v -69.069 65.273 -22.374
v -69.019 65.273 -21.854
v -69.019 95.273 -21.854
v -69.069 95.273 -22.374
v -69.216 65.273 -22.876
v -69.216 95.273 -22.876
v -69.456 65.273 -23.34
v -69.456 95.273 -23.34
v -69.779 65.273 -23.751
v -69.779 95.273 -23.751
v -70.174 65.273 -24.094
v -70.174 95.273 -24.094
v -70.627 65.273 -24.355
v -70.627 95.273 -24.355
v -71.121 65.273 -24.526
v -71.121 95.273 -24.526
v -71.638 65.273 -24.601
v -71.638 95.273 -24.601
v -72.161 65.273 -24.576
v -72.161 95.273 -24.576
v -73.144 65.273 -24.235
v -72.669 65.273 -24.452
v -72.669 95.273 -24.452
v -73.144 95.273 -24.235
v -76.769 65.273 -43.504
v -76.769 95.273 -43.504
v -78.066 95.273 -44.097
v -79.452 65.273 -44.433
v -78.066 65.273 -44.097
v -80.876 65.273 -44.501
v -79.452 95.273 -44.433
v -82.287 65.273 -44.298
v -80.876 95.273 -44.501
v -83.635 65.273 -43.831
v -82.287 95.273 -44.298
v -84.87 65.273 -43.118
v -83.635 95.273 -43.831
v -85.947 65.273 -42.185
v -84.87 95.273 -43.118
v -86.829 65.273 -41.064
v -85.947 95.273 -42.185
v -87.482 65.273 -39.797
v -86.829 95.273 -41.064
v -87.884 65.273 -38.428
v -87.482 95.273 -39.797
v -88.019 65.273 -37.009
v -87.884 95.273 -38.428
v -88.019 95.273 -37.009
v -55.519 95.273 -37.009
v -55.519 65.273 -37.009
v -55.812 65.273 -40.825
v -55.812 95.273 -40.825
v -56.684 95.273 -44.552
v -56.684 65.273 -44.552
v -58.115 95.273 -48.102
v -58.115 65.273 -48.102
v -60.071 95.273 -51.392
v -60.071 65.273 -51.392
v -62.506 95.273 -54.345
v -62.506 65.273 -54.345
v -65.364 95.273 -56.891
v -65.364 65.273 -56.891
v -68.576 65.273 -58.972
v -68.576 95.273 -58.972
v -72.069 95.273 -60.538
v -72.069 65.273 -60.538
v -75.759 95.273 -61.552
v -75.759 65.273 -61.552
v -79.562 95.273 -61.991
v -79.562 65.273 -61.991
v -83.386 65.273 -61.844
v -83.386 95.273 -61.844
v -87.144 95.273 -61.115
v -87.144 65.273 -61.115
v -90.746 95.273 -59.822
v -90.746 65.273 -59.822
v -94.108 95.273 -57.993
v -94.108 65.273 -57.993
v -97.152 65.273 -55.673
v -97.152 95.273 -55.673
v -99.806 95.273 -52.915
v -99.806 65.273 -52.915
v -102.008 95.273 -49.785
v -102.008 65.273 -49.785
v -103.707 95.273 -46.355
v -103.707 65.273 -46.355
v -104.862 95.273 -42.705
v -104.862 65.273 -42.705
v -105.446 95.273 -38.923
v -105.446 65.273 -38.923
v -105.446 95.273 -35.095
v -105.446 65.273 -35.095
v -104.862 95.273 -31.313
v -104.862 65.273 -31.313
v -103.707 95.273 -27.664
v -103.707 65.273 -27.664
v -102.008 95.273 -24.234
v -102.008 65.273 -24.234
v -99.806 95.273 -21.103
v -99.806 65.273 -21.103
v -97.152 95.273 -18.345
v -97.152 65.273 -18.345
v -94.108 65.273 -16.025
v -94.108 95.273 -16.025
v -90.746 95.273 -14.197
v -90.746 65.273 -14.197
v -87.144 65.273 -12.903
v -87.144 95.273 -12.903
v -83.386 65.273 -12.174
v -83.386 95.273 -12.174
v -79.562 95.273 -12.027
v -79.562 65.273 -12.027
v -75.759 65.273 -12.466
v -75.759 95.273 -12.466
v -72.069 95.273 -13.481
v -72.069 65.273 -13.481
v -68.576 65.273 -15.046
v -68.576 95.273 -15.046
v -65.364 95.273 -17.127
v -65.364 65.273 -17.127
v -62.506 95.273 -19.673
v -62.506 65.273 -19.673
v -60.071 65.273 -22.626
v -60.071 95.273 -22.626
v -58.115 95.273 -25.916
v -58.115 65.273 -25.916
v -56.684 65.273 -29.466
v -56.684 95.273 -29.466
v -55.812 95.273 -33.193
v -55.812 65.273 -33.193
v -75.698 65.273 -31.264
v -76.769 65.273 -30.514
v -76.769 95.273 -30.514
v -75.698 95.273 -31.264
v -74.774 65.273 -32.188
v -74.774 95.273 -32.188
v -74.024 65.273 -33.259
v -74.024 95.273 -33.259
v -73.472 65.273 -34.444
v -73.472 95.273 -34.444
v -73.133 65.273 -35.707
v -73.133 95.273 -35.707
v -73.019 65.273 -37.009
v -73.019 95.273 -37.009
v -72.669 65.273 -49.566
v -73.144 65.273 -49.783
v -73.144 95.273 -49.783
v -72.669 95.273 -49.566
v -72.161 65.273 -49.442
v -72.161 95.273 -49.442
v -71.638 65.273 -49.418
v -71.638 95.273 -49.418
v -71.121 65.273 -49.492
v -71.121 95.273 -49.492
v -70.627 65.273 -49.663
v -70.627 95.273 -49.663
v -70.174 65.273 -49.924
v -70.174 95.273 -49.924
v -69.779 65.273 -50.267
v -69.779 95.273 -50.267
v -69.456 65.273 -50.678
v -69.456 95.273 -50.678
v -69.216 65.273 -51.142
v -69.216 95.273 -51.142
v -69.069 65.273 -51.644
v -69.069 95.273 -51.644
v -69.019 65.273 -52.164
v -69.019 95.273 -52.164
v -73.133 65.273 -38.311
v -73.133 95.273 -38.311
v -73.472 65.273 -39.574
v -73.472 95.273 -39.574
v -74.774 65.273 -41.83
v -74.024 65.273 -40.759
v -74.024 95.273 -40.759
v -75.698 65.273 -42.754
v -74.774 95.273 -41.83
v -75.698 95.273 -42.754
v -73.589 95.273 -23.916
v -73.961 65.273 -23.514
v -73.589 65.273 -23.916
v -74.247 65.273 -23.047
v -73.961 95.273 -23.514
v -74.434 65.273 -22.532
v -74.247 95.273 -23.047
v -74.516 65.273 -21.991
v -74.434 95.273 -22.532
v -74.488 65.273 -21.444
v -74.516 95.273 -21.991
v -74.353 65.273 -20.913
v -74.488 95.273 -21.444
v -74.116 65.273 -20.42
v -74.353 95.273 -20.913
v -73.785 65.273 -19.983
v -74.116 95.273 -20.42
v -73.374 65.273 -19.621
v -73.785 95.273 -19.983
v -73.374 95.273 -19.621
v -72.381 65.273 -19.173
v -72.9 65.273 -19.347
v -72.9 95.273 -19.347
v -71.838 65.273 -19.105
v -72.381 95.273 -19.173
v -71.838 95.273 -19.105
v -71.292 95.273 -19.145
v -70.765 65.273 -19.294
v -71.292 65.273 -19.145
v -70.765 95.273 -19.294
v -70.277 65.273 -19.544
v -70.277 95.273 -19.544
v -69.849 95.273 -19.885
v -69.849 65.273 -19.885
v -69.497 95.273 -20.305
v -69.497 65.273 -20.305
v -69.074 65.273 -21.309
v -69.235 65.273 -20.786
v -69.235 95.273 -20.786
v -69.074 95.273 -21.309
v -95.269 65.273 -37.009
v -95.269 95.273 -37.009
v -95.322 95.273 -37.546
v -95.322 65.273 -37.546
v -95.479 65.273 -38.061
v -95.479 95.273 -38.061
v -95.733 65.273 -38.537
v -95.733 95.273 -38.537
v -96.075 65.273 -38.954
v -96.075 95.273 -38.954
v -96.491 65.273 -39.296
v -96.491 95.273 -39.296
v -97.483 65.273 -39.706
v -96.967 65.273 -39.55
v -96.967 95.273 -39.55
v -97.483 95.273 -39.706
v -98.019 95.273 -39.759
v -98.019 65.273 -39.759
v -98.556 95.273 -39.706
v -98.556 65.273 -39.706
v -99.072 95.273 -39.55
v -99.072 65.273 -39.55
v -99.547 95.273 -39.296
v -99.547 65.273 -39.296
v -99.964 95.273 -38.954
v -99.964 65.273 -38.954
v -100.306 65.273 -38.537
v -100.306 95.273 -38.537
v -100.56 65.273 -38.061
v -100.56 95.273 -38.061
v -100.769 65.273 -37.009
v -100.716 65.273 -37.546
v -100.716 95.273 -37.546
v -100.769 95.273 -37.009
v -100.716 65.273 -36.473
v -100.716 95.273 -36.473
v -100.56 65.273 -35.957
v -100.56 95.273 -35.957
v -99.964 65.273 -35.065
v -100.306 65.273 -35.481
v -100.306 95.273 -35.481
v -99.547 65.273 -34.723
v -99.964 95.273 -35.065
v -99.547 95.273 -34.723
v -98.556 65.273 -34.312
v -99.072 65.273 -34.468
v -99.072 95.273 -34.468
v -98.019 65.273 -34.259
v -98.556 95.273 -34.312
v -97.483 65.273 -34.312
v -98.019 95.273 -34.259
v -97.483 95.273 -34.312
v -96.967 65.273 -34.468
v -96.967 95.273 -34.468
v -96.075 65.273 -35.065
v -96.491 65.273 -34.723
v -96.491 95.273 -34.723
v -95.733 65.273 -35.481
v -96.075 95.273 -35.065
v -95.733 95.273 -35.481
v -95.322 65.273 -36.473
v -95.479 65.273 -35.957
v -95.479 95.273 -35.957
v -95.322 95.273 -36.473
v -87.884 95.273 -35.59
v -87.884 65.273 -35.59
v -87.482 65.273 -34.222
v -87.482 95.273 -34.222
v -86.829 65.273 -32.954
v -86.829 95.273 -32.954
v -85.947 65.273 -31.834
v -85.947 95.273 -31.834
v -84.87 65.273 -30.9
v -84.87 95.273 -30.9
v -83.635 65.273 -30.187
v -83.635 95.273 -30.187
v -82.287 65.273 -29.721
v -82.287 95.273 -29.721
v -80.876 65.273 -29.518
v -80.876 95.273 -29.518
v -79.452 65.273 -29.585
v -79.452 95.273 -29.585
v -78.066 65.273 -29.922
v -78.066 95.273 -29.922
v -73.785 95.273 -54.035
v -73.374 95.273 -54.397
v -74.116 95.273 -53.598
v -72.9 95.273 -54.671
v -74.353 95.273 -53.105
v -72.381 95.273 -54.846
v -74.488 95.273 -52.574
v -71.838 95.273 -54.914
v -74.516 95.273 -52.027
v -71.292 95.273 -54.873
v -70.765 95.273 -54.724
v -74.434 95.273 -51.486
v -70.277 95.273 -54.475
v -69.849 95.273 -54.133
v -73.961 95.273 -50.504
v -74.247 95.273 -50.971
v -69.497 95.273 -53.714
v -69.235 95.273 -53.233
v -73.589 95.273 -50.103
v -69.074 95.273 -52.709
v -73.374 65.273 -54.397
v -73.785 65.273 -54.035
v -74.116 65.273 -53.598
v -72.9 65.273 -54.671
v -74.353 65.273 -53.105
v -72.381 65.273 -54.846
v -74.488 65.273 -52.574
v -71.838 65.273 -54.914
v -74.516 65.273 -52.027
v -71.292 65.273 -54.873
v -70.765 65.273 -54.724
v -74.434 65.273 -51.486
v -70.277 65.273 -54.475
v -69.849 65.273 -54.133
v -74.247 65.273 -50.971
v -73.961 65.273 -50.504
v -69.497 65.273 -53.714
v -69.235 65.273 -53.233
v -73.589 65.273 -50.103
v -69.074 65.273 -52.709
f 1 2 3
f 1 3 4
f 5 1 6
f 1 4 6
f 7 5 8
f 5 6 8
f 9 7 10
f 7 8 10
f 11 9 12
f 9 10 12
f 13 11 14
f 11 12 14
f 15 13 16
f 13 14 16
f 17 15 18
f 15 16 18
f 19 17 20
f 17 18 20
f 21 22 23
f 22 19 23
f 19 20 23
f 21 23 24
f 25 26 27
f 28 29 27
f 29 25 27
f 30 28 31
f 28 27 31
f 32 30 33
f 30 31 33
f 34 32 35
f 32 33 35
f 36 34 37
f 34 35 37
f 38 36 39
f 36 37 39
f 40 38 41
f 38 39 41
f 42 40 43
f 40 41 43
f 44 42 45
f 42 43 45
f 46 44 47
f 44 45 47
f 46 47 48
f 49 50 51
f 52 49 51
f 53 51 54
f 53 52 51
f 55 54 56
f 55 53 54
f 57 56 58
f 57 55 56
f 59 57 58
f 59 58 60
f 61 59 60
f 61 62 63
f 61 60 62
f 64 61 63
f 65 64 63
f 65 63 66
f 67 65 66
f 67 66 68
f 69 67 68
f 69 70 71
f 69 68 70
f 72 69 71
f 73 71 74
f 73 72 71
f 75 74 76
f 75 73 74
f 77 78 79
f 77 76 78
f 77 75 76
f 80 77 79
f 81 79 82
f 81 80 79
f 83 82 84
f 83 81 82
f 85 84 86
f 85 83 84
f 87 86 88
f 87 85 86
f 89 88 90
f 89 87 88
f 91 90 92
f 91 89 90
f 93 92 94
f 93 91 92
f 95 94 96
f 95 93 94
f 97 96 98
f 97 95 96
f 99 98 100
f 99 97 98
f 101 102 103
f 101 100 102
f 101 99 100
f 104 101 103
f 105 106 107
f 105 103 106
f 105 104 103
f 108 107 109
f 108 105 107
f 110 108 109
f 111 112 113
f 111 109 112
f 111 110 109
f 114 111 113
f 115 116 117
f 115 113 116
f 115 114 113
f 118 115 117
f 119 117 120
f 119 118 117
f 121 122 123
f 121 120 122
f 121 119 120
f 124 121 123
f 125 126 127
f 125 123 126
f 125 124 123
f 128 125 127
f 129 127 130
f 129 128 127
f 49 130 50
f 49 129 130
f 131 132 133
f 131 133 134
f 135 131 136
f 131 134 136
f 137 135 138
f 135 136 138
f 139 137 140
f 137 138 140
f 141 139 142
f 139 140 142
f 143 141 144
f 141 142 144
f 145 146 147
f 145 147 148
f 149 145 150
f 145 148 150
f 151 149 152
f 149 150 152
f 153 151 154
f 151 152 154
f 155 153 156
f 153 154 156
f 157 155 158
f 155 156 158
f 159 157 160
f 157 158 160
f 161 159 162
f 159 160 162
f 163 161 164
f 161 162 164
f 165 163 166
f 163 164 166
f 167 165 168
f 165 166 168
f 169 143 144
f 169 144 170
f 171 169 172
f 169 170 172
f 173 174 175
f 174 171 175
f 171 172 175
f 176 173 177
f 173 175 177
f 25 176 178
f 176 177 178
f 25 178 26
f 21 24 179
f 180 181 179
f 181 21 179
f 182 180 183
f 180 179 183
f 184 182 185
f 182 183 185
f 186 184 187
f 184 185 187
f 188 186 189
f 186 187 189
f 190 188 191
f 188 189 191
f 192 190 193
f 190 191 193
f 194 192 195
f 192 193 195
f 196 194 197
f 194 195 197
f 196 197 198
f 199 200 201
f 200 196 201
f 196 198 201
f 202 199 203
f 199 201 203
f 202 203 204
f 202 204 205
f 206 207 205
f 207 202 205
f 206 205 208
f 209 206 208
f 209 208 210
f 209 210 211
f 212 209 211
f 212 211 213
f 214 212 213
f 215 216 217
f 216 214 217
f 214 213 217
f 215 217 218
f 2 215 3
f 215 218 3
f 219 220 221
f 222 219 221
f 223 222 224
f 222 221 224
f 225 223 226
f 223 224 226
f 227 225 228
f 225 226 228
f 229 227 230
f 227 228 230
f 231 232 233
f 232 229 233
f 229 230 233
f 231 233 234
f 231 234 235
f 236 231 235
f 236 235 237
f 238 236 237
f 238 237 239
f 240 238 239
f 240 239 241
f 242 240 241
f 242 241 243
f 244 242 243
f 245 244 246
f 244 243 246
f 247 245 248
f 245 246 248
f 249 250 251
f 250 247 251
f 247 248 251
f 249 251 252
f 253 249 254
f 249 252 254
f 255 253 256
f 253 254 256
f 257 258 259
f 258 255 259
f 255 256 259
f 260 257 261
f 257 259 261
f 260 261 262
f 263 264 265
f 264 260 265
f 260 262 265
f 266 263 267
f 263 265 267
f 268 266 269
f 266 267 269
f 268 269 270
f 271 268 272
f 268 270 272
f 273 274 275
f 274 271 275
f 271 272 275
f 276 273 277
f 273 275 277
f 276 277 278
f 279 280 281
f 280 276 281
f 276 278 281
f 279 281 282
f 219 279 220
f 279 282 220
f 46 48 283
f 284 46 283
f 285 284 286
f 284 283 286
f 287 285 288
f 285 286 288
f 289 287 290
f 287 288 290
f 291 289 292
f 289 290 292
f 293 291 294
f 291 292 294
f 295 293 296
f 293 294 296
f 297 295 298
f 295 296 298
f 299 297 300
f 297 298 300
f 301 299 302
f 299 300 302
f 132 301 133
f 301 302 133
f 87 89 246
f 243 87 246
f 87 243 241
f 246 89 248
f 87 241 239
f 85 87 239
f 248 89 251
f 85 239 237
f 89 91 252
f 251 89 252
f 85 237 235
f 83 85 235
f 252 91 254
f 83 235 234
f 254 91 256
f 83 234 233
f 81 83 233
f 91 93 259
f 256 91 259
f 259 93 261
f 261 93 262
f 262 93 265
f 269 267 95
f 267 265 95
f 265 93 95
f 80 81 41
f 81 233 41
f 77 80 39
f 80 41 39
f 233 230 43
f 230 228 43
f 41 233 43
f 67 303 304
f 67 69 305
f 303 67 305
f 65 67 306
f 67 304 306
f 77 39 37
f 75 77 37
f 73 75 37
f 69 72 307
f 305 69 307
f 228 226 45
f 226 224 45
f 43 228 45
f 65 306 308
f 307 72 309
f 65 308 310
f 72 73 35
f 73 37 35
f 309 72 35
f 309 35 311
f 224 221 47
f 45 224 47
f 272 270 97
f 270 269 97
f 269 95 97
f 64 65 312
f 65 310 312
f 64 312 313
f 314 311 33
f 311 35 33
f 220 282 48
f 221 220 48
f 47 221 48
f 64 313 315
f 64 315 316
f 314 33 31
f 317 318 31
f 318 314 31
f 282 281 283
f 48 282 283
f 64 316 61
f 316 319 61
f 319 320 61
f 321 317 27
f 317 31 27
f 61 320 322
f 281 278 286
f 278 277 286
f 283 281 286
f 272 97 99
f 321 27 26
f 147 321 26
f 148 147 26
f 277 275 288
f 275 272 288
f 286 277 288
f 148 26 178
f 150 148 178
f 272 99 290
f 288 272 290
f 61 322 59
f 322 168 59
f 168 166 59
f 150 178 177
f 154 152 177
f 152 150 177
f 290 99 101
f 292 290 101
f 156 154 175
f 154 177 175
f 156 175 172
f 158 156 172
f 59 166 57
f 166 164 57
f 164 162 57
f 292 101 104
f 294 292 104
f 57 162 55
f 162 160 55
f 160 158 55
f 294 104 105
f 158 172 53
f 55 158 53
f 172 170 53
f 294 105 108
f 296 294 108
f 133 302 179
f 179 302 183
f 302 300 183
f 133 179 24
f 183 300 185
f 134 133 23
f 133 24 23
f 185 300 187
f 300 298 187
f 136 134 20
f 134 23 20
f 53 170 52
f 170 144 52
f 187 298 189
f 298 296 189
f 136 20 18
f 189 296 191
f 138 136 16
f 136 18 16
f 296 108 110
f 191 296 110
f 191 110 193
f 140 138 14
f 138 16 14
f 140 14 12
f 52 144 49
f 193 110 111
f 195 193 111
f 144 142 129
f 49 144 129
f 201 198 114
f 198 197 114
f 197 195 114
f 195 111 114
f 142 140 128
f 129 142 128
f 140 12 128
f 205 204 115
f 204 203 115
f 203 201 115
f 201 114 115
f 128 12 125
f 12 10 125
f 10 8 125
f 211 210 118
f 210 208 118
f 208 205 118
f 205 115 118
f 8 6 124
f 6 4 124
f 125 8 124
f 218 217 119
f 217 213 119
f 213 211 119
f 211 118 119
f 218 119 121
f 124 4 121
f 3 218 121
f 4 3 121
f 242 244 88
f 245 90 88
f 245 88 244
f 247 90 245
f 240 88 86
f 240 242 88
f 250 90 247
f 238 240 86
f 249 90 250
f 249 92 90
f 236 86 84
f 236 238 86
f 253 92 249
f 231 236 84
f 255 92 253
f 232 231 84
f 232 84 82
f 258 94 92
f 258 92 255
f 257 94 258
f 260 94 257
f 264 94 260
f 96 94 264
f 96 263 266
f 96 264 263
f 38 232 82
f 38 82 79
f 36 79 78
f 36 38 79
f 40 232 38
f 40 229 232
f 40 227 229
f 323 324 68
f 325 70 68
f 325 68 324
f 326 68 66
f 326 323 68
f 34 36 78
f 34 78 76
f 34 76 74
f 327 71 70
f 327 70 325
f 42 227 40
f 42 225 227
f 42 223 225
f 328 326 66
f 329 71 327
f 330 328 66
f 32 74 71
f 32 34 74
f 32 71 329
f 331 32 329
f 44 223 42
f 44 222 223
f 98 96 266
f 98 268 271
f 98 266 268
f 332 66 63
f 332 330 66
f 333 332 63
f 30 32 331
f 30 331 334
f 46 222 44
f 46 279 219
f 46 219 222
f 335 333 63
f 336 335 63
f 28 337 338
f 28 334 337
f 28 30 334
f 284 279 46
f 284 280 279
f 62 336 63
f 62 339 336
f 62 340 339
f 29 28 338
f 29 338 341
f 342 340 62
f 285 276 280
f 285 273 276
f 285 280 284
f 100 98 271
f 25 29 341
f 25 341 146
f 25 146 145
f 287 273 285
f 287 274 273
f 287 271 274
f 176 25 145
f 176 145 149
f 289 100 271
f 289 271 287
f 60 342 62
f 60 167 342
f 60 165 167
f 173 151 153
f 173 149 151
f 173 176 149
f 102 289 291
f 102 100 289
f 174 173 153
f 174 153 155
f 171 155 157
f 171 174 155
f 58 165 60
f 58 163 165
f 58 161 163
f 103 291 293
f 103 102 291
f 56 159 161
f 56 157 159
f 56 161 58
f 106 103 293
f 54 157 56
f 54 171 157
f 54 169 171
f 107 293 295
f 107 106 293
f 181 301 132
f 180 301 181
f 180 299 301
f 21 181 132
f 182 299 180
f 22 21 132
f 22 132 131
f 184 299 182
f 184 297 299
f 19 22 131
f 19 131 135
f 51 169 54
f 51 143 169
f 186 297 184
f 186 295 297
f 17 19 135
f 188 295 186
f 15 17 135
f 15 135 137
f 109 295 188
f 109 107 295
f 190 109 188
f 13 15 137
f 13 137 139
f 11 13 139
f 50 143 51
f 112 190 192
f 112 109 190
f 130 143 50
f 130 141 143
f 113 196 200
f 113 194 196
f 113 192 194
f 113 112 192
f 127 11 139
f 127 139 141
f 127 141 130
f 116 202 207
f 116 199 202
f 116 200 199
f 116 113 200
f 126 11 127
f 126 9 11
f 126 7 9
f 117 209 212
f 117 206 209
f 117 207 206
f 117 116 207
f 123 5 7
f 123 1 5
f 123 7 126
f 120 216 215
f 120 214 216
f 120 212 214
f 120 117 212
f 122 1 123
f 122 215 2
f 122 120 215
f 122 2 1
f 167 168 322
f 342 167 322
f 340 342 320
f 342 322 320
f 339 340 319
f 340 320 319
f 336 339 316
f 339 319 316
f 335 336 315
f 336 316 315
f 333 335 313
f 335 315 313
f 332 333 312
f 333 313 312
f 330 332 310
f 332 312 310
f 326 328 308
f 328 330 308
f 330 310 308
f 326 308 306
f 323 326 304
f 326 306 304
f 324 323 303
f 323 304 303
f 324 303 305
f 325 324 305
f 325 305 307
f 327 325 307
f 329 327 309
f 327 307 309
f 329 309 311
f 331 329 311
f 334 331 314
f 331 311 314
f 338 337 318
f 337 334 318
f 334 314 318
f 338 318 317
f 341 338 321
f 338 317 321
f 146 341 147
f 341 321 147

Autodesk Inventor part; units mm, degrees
ref_plane "YZ Plane" through (0, 0, 0) normal (1, 0, 0) x (0, 1, 0)
ref_plane "XZ Plane" through (0, 0, 0) normal (0, 1, 0) x (-1, 0, 0)
ref_plane "XY Plane" through (0, 0, 0) normal (0, 0, 1) x (1, 0, 0)
ref_plane "Work Plane1" through (-80.5192, 95.2728, -37.0091) normal (-0.0000001, -1, 0.0000001) x (1, -0.0000001, 0)
sketch "Sketch1" plane through (-80.5192, 95.2728, -37.0091) normal (-0.0000001, -1, 0.0000001) x (1, -0.0000001, 0)
  circle A0 centre (0, 0) radius 25
  circle A1 centre (0, 0) radius 7.5
  circle A2 centre (8.75, -15.1554) radius 2.75
  circle A3 centre (8.75, 15.1554) radius 2.75
  circle A4 centre (-17.5, 0) radius 2.75
  line L0 (8.75, 15.1554) -> (0, 0)
  line L1 (0, 0) -> (8.75, -15.1554)
  line L2 (0, 0) -> (-17.5, 0)
  point P0 (80.5192, 37.0091)
  dimension "d0" = 50
  dimension "d1" = 15
extrude "Extrusion1" add sketch "Sketch1" along normal blind 30
properties part number "Pierścień"
